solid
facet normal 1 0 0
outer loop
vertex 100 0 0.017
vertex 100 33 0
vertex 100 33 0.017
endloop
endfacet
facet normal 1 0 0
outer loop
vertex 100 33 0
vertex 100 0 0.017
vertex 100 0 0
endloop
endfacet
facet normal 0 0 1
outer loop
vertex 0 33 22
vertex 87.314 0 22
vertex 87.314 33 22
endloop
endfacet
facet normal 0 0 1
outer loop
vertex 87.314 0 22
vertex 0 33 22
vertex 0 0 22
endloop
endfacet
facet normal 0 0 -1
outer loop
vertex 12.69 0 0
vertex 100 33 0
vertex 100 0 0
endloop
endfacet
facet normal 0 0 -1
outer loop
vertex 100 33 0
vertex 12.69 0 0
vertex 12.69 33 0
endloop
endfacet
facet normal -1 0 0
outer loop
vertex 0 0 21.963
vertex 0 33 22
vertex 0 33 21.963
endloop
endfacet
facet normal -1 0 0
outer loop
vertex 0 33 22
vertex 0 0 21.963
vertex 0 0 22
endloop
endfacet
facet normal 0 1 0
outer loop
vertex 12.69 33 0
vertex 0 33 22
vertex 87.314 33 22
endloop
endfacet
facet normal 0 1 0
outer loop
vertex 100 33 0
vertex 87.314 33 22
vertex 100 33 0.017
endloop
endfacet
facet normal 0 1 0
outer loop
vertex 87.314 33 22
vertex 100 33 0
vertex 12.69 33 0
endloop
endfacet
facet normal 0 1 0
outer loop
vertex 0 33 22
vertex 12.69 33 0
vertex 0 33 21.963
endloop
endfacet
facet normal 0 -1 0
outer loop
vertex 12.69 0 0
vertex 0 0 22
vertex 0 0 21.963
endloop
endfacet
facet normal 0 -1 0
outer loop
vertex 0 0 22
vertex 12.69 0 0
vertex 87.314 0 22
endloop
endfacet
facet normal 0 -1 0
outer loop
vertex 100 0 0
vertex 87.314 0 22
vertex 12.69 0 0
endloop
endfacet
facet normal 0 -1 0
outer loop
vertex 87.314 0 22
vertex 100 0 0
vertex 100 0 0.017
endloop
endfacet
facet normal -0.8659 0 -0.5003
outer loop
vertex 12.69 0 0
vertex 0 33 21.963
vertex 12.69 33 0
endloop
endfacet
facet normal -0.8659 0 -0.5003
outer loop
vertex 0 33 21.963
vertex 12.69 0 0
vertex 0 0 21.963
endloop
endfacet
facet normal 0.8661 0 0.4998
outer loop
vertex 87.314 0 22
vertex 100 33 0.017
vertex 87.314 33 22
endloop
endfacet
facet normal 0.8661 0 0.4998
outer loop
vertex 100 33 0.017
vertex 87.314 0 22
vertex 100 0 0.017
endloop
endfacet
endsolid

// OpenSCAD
nothing = 0.01;

module beam(length, long_side, short_side, a_start_short,
            a_start_long, a_stop_short, a_stop_long) {
  difference() {
    cube([ length, long_side, short_side ]);

    /*
      make the ends angled by subtracting a triangle from them

         a        b        c
      ------ = ------ = ------
      sin(A)   sin(B)   sin(C)
              B
             /\
          c /  \ a
           /    \
        A /______\ C
              b

      two angles and a side is always known
      - the corner angle which is always 90
      - the angle parameter
      - the length of the side which is going to be angled
    */

    if (!is_undef(a_start_short)) {
      /*
        A angle is 90
        B angle is 90 - a_start_short
        C angle is a_start_short
        c side is short_side
        b side length is missing

        b = c * sin(C) / sin(B)
      */

      b_length =
          short_side * sin(a_start_short) / sin(90 - a_start_short);

      if (a_start_short > 0) {
        translate([ -nothing, long_side + nothing, -nothing ])
            rotate([ 90, 0, 0 ])
                linear_extrude(long_side + 2 * nothing)
                    polygon(points = [
                      [ -nothing, 0 ], [ 0, short_side - nothing ],
                      [ b_length + nothing, -nothing ]
                    ]);
      } else {
        translate([ -nothing, -nothing, short_side + nothing ])
            rotate([ -90, 0, 0 ])
                linear_extrude(long_side + 2 * nothing)
                    polygon(points = [
                      [ -nothing, short_side ],
                      [ -b_length, -nothing ], [ 0, -nothing ]
                    ]);
      }
    } else if (!is_undef(a_start_long)) {
      /*
        A angle is 90
        B angle is 90 - a_start_long
        C angle is a_start_long
        c side is long_side
        b side length is missing

        b = c * sin(C) / sin(B)
      */

      b_length =
          long_side * sin(a_start_long) / sin(90 - a_start_long);

      if (a_start_long > 0) {
        translate([ -nothing, -nothing, -nothing ])
            linear_extrude(short_side + 2 * nothing)
                polygon(points = [
                  [ -nothing, 0 ], [ 0, long_side - nothing ],
                  [ b_length + nothing, -nothing ]
                ]);
      } else {
        translate([ -nothing, 0, -nothing ])
            linear_extrude(short_side + 2 * nothing)
                polygon(points = [
                  [ -b_length, long_side + nothing ], [ 0, 0 ],
                  [ 0, long_side + nothing ]
                ]);
      }
    }

    if (!is_undef(a_stop_short)) {
      /*
        A angle is 90
        B angle is 90 - a_stop_short
        C angle is a_stop_short
        c side is short_side
        b side length is missing

        b = c * sin(C) / sin(B)
      */

      b_length =
          short_side * sin(a_stop_short) / sin(90 - a_stop_short);

      if (a_stop_short > 0) {
        translate([ 0, long_side + nothing, 0 ]) rotate([ 90, 0, 0 ])
            linear_extrude(long_side + 2 * nothing) polygon(
                points = [[length + nothing, 0],
                          [length + nothing, short_side + nothing],
                          [length - b_length + nothing,
                           short_side + nothing]]);
      } else {
        translate([ 0, long_side + nothing, -nothing ]) rotate(
            [ 90, 0, 0 ]) linear_extrude(long_side + 2 * nothing)
            polygon(points =
                        [[length + b_length, 0],
                         [length + nothing, 0],
                         [length + nothing, short_side + nothing]]);
      }
    } else if (!is_undef(a_stop_long)) {
      /*
        A angle is 90
        B angle is 90 - a_stop_long
        C angle is a_stop_long
        c side is long_side
        b side length is missing

        b = c * sin(C) / sin(B)
      */

      b_length = long_side * sin(a_stop_long) / sin(90 - a_stop_long);

      if (a_stop_long > 0) {
        translate([ 0, 0, -nothing ])
            linear_extrude(short_side + 2 * nothing) polygon(
                points = [[length - b_length, long_side + nothing],
                          [length + nothing, -nothing],
                          [length + nothing, long_side + nothing]]);
      } else {
        translate([ 0, 0, -nothing ])
            linear_extrude(short_side + 2 * nothing) polygon(
                points = [[length + b_length, -nothing],
                          [length + nothing, -nothing],
                          [length + nothing, long_side + nothing]]);
      }
    }
  }
}

beam(length = 100, long_side = 33, short_side = 22,
     a_start_short = 30, a_stop_short = 30);
